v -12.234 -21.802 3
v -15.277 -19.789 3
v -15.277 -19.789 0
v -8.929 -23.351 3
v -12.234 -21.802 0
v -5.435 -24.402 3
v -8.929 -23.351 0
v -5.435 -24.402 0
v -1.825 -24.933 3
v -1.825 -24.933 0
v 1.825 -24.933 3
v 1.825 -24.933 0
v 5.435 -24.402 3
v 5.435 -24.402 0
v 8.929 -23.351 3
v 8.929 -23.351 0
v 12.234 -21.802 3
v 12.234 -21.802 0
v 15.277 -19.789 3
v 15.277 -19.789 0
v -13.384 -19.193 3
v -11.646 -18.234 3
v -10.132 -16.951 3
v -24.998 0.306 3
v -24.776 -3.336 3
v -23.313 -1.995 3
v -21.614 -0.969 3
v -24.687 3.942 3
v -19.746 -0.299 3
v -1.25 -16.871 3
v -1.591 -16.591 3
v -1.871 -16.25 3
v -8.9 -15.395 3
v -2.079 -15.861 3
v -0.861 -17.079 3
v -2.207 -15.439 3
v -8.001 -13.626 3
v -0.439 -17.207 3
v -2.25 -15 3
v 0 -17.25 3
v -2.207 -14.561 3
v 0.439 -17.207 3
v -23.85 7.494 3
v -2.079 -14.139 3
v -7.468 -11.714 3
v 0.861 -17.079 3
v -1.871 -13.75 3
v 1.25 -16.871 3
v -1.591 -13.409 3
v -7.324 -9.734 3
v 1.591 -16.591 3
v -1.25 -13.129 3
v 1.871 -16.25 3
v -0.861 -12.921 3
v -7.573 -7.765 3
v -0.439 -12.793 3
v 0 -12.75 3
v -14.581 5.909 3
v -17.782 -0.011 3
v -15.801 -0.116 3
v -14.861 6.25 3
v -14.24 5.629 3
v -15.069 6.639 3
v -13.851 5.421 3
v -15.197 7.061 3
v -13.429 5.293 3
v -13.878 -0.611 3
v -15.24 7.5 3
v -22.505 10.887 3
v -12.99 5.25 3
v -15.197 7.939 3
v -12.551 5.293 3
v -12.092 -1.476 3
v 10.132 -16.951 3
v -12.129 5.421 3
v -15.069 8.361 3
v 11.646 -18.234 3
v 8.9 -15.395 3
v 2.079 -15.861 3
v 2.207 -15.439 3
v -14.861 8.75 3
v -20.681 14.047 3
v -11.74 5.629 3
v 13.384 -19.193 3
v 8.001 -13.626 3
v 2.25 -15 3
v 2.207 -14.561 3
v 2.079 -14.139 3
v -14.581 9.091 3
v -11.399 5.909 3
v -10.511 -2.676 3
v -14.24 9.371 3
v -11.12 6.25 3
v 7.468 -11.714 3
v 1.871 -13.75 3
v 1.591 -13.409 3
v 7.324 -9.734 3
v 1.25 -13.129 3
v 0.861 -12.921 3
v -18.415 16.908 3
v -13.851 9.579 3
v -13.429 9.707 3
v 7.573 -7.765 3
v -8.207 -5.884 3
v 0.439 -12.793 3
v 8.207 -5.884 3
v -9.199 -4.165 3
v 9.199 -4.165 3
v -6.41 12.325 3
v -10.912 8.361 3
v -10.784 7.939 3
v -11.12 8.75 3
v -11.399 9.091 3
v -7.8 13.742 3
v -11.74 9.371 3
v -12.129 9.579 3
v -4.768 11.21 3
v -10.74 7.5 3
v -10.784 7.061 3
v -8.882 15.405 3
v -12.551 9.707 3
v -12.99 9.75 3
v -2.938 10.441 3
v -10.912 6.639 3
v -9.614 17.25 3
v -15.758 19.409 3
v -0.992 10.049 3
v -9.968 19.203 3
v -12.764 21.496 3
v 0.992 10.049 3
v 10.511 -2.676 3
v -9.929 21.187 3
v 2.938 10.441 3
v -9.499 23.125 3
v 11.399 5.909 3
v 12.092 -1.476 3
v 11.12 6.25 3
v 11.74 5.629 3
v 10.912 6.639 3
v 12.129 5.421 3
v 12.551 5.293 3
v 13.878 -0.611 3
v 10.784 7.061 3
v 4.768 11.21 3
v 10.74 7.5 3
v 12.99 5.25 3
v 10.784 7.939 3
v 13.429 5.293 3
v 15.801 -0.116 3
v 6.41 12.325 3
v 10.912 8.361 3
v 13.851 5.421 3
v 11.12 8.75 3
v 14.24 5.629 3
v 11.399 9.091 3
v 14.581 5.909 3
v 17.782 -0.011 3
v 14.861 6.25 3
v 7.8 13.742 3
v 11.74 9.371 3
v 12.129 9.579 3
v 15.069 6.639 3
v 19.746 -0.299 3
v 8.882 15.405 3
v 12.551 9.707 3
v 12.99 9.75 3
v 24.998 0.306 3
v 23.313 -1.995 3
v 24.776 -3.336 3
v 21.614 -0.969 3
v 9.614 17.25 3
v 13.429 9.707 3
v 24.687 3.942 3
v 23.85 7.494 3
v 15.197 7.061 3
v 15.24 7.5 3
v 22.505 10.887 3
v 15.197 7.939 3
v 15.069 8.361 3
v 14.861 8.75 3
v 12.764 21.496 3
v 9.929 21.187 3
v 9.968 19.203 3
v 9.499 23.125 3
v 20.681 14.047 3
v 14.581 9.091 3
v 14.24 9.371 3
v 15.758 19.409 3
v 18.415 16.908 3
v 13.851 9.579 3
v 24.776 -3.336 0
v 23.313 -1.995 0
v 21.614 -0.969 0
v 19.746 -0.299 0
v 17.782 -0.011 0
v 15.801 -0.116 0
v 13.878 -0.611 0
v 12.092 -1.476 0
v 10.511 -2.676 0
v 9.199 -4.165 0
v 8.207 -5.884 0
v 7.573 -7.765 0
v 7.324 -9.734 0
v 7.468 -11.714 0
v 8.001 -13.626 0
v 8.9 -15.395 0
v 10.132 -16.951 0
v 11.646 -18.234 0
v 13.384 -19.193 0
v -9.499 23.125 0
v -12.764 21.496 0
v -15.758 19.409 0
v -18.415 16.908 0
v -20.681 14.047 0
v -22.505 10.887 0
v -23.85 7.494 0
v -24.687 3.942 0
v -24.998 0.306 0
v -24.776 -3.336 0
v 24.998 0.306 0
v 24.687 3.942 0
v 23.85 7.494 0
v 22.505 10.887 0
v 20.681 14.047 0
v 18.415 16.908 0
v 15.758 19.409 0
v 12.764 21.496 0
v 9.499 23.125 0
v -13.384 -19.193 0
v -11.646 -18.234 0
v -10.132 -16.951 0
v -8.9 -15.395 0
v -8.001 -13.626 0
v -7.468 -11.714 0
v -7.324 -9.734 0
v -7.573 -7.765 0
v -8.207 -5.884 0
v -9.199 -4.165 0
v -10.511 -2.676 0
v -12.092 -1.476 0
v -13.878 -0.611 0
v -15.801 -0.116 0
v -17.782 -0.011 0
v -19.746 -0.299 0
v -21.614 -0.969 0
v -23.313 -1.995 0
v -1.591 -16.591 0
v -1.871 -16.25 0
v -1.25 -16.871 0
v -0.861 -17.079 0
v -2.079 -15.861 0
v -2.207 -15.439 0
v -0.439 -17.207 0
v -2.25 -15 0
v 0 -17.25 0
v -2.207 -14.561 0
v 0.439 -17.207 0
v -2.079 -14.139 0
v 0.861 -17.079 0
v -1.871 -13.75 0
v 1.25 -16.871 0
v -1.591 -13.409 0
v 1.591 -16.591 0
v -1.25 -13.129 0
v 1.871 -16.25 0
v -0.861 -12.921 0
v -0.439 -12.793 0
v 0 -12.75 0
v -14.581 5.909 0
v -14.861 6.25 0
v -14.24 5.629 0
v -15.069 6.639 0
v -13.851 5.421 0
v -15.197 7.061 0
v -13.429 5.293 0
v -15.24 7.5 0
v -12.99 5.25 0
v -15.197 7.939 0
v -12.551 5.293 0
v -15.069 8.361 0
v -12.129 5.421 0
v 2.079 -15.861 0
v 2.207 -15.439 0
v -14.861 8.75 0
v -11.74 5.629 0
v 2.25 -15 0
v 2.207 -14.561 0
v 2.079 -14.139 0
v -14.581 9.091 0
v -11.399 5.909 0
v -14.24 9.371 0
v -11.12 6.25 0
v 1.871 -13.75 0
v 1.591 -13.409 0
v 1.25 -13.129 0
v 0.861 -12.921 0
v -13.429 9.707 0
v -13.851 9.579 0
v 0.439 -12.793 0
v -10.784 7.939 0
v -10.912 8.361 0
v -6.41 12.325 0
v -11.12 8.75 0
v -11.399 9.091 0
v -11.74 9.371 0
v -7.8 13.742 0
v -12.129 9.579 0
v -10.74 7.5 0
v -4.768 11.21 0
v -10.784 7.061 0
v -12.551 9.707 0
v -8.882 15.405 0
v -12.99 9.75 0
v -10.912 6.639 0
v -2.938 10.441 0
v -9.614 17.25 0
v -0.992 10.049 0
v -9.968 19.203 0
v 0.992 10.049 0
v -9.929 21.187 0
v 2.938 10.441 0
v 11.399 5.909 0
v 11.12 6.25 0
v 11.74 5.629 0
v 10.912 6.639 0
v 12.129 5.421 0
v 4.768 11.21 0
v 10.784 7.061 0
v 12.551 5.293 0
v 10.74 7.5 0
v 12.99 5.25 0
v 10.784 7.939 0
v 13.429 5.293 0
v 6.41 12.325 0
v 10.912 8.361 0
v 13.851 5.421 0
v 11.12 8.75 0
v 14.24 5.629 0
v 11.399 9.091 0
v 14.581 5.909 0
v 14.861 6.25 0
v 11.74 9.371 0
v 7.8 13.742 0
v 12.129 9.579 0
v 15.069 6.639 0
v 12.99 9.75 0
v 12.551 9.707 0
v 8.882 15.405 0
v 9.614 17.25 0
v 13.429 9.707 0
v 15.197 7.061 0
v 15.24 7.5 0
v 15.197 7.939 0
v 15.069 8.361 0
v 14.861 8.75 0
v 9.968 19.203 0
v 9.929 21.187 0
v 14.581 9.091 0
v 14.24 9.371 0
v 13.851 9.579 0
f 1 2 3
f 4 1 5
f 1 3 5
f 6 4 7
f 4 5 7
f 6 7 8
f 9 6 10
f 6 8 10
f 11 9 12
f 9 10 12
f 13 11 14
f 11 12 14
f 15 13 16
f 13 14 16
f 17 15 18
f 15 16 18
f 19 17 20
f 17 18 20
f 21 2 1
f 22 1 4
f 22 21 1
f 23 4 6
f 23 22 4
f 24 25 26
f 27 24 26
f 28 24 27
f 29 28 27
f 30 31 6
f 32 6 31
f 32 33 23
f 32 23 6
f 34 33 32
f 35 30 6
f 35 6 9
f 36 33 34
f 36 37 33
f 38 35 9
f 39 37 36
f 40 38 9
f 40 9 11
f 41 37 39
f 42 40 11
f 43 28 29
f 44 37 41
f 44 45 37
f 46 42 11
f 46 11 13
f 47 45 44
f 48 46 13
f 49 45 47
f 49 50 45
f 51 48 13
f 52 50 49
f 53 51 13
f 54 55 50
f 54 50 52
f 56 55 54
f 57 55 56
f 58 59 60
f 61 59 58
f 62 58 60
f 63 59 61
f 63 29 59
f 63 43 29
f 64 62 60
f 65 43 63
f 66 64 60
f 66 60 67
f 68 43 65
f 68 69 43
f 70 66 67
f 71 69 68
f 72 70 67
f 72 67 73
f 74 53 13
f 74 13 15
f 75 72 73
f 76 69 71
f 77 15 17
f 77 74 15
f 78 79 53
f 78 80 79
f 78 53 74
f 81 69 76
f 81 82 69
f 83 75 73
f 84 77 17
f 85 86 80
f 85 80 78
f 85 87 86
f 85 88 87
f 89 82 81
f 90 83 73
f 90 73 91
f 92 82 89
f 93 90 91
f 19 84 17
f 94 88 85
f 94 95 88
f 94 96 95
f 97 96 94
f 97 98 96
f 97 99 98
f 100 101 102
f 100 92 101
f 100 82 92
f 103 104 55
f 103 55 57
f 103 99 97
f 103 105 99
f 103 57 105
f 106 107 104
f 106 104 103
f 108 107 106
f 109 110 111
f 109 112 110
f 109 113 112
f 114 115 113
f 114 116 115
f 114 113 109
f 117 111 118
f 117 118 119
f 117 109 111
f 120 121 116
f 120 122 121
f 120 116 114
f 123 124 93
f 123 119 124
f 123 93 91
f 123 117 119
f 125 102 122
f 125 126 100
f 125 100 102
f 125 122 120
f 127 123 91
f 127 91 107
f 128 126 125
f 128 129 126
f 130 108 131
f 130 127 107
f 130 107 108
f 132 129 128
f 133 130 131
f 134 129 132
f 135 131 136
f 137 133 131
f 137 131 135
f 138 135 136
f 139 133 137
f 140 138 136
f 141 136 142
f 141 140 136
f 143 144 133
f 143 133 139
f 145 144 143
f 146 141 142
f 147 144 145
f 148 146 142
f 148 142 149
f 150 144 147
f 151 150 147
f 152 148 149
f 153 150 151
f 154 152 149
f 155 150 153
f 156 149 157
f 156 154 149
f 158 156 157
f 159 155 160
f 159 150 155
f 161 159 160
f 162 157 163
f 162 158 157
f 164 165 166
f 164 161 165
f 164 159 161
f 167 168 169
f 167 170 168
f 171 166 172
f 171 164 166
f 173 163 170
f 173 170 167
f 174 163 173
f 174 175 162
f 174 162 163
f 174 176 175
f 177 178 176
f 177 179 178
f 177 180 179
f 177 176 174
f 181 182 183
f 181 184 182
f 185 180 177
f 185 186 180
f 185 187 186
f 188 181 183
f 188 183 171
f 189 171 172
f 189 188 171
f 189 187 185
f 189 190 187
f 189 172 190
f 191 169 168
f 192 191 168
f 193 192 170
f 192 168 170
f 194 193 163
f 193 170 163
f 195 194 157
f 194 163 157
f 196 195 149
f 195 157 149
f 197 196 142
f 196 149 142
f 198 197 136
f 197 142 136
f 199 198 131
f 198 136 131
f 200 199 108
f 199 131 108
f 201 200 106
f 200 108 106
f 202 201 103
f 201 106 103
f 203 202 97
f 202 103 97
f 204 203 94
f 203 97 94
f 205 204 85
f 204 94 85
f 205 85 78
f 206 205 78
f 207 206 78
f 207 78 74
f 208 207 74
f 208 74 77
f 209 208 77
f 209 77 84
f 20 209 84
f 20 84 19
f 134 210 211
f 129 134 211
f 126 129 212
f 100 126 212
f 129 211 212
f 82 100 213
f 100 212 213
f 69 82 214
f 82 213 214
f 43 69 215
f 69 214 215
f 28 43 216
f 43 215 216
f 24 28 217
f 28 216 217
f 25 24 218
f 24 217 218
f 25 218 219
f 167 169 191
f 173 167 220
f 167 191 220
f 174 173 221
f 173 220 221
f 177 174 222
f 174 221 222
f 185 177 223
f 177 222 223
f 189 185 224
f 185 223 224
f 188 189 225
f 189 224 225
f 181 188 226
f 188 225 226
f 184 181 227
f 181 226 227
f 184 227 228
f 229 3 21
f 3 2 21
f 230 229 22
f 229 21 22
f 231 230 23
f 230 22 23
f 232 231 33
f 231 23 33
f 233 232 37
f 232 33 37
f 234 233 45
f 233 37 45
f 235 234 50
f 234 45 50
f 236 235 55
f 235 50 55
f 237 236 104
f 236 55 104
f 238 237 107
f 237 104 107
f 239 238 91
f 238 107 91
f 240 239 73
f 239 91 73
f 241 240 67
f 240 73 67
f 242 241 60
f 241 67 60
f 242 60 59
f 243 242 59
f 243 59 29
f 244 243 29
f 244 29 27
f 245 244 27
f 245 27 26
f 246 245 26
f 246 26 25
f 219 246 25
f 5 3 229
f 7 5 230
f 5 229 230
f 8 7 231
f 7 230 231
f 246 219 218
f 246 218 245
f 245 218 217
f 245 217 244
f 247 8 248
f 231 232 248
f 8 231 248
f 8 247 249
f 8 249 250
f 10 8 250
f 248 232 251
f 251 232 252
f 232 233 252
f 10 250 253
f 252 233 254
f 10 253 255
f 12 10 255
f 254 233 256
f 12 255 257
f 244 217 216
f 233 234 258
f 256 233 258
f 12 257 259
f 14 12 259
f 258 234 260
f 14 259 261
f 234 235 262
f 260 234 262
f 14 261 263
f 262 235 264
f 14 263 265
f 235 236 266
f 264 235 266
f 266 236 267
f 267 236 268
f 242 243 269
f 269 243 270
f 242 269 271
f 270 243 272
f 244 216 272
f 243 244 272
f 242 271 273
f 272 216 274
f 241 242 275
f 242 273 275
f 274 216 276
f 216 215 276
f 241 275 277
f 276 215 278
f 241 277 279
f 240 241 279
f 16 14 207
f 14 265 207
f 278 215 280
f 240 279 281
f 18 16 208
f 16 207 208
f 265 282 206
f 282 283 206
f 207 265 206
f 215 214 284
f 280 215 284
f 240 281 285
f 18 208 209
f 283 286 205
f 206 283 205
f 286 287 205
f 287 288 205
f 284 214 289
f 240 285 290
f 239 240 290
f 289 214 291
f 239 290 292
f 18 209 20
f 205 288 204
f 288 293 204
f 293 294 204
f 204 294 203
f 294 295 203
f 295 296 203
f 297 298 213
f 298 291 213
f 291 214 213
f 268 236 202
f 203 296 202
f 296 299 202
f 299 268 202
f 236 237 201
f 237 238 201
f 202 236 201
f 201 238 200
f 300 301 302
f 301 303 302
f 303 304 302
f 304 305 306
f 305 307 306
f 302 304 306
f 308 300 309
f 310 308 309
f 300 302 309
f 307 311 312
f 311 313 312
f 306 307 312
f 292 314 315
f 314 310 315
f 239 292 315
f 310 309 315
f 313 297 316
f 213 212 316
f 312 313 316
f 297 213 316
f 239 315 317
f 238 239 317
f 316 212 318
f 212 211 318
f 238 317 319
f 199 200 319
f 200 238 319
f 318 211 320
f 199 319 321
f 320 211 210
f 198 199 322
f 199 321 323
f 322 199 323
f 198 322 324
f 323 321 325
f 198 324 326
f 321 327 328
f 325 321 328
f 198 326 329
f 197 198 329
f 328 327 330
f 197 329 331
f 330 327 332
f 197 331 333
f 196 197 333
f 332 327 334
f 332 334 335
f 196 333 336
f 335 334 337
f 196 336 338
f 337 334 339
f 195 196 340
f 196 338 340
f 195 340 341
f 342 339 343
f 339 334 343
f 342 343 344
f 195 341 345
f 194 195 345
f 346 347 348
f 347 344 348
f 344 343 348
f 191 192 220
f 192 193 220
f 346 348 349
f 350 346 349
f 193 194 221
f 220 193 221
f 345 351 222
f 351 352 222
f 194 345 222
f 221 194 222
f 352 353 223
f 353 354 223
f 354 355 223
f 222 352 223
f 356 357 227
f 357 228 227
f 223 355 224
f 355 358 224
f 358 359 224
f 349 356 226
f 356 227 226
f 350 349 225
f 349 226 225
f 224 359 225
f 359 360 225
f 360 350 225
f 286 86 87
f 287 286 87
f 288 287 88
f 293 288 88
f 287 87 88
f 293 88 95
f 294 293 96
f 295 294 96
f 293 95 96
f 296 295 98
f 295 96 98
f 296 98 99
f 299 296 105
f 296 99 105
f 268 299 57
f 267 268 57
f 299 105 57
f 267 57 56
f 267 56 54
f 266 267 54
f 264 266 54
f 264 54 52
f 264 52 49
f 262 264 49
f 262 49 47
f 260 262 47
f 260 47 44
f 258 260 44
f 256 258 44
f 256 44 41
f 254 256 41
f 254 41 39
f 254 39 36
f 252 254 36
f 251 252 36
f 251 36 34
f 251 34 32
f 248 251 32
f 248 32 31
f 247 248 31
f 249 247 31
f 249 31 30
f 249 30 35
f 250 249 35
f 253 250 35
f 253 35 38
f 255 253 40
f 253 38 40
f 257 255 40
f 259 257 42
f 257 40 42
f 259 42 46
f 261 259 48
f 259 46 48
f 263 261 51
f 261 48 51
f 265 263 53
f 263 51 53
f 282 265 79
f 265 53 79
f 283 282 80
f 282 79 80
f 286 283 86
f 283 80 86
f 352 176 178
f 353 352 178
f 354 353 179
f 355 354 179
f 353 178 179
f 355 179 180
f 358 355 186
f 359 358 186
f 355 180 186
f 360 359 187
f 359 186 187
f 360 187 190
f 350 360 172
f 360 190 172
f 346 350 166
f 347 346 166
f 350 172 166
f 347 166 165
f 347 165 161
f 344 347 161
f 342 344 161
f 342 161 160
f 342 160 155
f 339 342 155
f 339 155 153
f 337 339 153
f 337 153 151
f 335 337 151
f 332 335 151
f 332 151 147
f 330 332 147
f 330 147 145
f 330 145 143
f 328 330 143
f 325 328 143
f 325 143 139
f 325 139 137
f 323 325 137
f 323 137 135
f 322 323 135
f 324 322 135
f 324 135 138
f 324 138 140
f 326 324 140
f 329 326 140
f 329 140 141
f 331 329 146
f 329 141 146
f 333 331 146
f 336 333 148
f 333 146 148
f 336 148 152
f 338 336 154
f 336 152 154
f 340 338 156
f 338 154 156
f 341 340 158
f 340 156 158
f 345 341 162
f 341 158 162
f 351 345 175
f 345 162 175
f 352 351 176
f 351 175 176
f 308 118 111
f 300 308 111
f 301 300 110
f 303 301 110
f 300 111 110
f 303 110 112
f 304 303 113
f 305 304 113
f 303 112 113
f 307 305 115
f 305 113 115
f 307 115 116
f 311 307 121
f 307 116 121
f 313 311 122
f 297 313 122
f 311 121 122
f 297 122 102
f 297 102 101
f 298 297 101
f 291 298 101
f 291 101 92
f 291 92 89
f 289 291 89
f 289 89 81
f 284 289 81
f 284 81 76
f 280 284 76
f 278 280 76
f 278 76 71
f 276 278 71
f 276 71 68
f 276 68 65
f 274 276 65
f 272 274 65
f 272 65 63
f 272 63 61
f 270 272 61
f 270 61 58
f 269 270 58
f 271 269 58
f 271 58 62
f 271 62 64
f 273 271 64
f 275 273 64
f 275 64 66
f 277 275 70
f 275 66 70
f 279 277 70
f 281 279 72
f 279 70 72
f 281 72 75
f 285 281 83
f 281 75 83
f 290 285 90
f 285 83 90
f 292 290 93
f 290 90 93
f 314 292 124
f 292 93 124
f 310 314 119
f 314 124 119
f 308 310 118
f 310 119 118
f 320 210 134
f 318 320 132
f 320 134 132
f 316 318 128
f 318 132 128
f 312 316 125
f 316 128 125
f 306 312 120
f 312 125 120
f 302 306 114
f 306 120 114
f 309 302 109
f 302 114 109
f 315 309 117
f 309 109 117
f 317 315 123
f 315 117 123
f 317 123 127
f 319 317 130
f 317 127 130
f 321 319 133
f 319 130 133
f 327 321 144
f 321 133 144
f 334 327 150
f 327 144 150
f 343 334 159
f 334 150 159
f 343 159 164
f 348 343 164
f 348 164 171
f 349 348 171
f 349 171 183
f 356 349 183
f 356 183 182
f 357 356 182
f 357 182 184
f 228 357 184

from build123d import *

# Parameters (mm, degrees)
F0_R     = 25
F1_DEPTH = 3
F2_R     = 2.25
F3_DEPTH = 25
F4_R     = 10
F5_DEPTH = 25


with BuildPart() as f1:
    # F0 (on Top) → F1 (new body)
    with BuildSketch(Plane.XY):
        Circle(F0_R)
    extrude(amount=F1_DEPTH)

    # F2 (on face) → F3 (cut)
    with BuildSketch(Plane.XY.offset(3)):
        with Locations((0, 15)):
            Circle(F2_R)
        with Locations((-12.990381, 7.5)):
            Circle(F2_R)
        with Locations((-12.990381, -7.5)):
            Circle(F2_R)
        with Locations((0, -15)):
            Circle(F2_R)
        with Locations((12.990381, -7.5)):
            Circle(F2_R)
        with Locations((12.990381, 7.5)):
            Circle(F2_R)
    extrude(amount=-F3_DEPTH, mode=Mode.SUBTRACT)

    # F4 (on face) → F5 (cut)
    with BuildSketch(Plane.XY.offset(3)):
        with Locations((0, 20)):
            Circle(F4_R)
        with Locations((-17.320508, -10)):
            Circle(F4_R)
        with Locations((17.320508, -10)):
            Circle(F4_R)
    extrude(amount=-F5_DEPTH, mode=Mode.SUBTRACT)


solid = f1.part
